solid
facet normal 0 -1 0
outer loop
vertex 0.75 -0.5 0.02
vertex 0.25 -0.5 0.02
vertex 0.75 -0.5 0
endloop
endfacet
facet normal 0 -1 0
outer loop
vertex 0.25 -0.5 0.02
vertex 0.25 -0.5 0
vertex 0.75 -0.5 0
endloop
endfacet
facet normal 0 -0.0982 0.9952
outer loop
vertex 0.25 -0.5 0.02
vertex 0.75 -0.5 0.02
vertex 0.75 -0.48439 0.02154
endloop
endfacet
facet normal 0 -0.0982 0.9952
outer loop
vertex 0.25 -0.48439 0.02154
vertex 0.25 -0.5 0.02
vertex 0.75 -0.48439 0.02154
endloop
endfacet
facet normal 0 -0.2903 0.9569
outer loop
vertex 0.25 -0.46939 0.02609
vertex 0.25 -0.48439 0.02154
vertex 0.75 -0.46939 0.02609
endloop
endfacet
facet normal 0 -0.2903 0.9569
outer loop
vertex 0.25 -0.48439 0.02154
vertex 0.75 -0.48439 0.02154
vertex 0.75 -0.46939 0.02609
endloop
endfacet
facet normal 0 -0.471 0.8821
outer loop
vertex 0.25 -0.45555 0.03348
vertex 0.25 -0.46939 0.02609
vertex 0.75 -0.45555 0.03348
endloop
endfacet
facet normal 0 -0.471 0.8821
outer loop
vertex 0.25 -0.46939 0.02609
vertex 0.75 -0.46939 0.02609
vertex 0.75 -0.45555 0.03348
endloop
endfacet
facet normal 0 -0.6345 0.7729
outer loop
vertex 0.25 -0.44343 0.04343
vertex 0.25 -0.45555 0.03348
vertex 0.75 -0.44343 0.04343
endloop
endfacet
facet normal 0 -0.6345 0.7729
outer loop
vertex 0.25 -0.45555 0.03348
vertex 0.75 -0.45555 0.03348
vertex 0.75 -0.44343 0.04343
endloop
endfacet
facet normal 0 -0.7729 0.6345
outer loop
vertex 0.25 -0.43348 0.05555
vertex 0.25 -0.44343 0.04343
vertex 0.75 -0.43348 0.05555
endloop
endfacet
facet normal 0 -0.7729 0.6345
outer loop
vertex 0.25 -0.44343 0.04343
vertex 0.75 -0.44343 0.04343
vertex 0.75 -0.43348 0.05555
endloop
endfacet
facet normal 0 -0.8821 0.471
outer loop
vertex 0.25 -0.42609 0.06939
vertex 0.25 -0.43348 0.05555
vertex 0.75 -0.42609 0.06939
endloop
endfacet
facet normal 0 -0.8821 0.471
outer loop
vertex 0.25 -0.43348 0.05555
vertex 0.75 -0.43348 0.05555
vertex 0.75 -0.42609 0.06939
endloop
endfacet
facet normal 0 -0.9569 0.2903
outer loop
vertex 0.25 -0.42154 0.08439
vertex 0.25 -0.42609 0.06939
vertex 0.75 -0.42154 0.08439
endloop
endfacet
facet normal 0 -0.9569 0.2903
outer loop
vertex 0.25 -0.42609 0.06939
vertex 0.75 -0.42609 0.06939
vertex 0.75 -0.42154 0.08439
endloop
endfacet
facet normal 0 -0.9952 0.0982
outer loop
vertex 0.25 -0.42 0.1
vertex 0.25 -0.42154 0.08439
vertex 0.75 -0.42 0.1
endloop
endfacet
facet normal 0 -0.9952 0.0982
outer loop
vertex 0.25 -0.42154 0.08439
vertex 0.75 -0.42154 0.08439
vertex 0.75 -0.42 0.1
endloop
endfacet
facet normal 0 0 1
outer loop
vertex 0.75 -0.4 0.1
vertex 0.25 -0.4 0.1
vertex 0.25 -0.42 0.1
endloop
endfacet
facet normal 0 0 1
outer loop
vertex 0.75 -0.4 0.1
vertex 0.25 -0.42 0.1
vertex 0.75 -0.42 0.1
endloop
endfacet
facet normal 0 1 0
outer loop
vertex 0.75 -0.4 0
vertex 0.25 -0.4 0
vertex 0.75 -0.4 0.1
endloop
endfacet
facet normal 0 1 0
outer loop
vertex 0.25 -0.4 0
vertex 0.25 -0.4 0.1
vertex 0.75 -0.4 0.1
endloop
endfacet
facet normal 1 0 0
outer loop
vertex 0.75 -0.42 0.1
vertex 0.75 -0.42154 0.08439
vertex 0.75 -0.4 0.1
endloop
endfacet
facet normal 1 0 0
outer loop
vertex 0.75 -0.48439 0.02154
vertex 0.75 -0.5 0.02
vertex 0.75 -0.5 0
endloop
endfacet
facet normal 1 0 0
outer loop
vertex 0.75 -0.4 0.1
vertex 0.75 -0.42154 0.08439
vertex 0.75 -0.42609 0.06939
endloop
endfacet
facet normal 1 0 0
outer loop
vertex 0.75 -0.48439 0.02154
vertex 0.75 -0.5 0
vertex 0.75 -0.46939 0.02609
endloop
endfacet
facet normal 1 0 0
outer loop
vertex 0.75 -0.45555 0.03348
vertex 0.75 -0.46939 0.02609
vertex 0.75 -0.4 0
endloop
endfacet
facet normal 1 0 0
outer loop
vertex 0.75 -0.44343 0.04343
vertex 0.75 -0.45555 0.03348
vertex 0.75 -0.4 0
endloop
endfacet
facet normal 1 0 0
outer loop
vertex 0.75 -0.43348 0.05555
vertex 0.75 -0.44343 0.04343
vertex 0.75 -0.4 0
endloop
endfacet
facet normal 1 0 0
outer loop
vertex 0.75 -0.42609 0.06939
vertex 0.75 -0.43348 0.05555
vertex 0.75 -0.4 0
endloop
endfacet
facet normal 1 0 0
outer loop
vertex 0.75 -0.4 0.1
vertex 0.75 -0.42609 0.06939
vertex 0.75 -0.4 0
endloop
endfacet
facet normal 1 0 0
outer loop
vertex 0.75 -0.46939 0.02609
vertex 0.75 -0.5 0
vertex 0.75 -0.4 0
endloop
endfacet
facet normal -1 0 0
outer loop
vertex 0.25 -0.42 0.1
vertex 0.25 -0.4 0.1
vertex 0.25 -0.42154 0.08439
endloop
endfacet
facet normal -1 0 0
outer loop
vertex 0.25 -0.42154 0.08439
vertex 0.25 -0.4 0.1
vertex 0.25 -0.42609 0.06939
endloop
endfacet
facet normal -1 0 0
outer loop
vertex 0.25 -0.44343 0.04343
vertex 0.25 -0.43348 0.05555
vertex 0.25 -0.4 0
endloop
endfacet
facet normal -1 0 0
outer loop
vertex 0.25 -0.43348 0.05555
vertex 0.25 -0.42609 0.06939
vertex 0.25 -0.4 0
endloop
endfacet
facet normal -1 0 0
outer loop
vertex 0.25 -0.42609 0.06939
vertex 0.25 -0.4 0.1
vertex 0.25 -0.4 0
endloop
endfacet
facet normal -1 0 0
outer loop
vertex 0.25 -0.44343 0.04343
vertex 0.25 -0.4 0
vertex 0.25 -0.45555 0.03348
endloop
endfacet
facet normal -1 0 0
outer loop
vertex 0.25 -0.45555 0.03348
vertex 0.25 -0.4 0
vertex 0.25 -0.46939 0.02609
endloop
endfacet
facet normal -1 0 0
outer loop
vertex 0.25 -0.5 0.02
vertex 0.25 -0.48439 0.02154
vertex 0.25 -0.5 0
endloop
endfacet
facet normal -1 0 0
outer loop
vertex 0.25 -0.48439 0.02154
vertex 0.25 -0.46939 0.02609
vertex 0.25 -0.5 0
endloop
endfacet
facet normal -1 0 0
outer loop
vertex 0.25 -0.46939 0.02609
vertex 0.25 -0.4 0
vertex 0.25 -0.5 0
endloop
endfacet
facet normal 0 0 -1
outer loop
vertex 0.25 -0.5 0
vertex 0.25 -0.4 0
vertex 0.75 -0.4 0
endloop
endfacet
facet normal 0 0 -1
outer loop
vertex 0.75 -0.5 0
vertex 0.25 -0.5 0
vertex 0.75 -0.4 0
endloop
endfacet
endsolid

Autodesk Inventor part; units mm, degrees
ref_plane "YZ Plane" through (0, 0, 0) normal (1, 0, 0) x (0, 1, 0)
ref_plane "XZ Plane" through (0, 0, 0) normal (0, 1, 0) x (-1, 0, 0)
sketch "스케치1" plane through (0, 0, 0) normal (0, 0, 1) x (1, 0, 0)
  line L0 (-0.15, 0) -> (0.9, 0) construction
  line L1 (0, -0.7) -> (0, 0.7) construction
  line L2 (0.25, -0.5) -> (0.75, -0.5)
  line L3 (0.75, -0.5) -> (0.75, 0.5)
  line L4 (0.75, 0.5) -> (0.25, 0.5)
  line L5 (0.25, 0.5) -> (0.25, -0.5)
  point P0 (0, 0)
  point P1 (0.5, -0.5)
  dimension "d7" = 0.5
  dimension "d8" = 1
  dimension "d9" = 0.25
extrude "돌출1" add sketch "스케치1" along normal blind 0.1
sketch "스케치3" plane through (0.25, 0.5, 0) normal (0, 1, 0) x (1, 0, 0)
  line L0 (-0.25, 0.7571) -> (-0.25, -0.2929) construction
  line L1 (-0.4, 0) -> (0.65, 0) construction
  line L2 (0.5, 0) -> (0, 0) projected
  line L3 (0, 0) -> (0, -0.1) projected
  line L4 (0.5, -0.1) -> (0, -0.1) projected
  line L5 (0.5, 0) -> (0.5, -0.1) projected
  arc A0 (0, -0.1) -> (0.5, -0.1) centre (0.25, 0.6071) ccw
  line L6 (0.25, -0.1) -> (0.25, 0.4799) construction
  point P0 (-0.25, 0)
  dimension "d10" = 0.75
sketch "스케치5" plane through (0, 0, 0.1) normal (0, 0, 1) x (1, 0, 0)
  line L0 (0.75, -0.5) -> (0.75, 0.5) projected
  line L1 (0.75, 0.5) -> (0.25, 0.5) projected
  line L2 (0.25, 0.5) -> (0.25, -0.5) projected
  line L3 (0.25, -0.5) -> (0.75, -0.5) projected
  line L4 (-0.15, 0) -> (0.9, 0) construction
  line L5 (0, -0.7) -> (0, 0.7) construction
  line L6 (-0.15, 0) -> (0.9, 0) construction
  line L7 (0, 0.7) -> (0, -0.7) construction
  line L8 (0.75, 0.4) -> (0.25, 0.4)
  line L9 (0.75, -0.4) -> (0.25, -0.4)
  point P0 (0, 0)
  dimension "d18" = 1
  dimension "d19" = 0.4
sketch "스케치6" plane through (0.75, -0.5, 0) normal (1, 0, 0) x (0, 0, -1)
  line L0 (0, 0) -> (0, 1) projected
  line L1 (0, 1) -> (-0.1, 1) projected
  line L2 (-0.1, 0) -> (-0.1, 1) projected
  line L3 (0, 0) -> (-0.1, 0) projected
  line L4 (0, 0.5) -> (-0.1, 0.5) construction
  line L5 (0, 0.92) -> (-0.1, 0.92)
  arc A0 (-0.1, 0.92) -> (-0.02, 1) centre (-0.1, 1) ccw
  arc A1 (-0.02, 0) -> (-0.1, 0.08) centre (-0.1, 0) ccw
  point P0 (-0.05, 0.5)
  point P1 (-0.05, 0.92)
  point P2 (-0.02, 0)
  point P3 (-0.1, 0.08)
  dimension "d20" = 0.42
extrude "돌출5" cut sketch "스케치6" against normal up to surface (0.5 mm away) contours L3 L2 A1 | L2 L1 A0
sketch "스케치7" plane through (0.75, -0.5, 0) normal (1, 0, 0) x (0, 0, -1)
  arc A0 (-0.1, 0.92) -> (-0.02, 1) centre (-0.1, 1) ccw projected
  line L0 (-0.1, 0.08) -> (-0.1, 0.92) projected
  arc A1 (-0.02, 0) -> (-0.1, 0.08) centre (-0.1, 0) ccw projected
  line L1 (0, 0) -> (-0.02, 0) projected
  line L2 (0, 0) -> (0, 1) projected
  line L3 (0, 1) -> (-0.02, 1) projected
  line L4 (0, 0.5) -> (-0.2526, 0.5) construction
  line L5 (-0.2526, 0.5) -> (-0.2526, 0.9) construction
  line L6 (-0.2526, 0.9) -> (-0.1, 0.9) construction
  line L7 (-0.2526, 0.1) -> (-0.1, 0.1) construction
  dimension "d23" = 0.4
ref_plane "작업 평면1" through (0.25, -0.4, 0) normal (0, -1, 0) x (1, 0, 0)
sketch "스케치8" plane through (0.25, -0.4, 0) normal (0, -1, 0) x (1, 0, 0)
  line L0 (0, 0.02) -> (0, 0.1) projected
  line L1 (0.5, 0.02) -> (0, 0.02) projected
  line L2 (0.5, 0.1) -> (0.5, 0.02) projected
  line L3 (0, 0.1) -> (0.5, 0.1) projected
  line L4 (0.5, 0.02) -> (0, 0.02) projected
  line L5 (0, 0) -> (0, 0.02) projected
  line L6 (0, 0) -> (0.5, 0) projected
  line L7 (0.5, 0) -> (0.5, 0.02) projected
  point P0 (-0.25, 0)
  point P1 (0.5, 0.02)
  point P2 (0, 0.02)
extrude "돌출6" cut sketch "스케치8" against normal blind 10
properties part number "flat_surface_1"
